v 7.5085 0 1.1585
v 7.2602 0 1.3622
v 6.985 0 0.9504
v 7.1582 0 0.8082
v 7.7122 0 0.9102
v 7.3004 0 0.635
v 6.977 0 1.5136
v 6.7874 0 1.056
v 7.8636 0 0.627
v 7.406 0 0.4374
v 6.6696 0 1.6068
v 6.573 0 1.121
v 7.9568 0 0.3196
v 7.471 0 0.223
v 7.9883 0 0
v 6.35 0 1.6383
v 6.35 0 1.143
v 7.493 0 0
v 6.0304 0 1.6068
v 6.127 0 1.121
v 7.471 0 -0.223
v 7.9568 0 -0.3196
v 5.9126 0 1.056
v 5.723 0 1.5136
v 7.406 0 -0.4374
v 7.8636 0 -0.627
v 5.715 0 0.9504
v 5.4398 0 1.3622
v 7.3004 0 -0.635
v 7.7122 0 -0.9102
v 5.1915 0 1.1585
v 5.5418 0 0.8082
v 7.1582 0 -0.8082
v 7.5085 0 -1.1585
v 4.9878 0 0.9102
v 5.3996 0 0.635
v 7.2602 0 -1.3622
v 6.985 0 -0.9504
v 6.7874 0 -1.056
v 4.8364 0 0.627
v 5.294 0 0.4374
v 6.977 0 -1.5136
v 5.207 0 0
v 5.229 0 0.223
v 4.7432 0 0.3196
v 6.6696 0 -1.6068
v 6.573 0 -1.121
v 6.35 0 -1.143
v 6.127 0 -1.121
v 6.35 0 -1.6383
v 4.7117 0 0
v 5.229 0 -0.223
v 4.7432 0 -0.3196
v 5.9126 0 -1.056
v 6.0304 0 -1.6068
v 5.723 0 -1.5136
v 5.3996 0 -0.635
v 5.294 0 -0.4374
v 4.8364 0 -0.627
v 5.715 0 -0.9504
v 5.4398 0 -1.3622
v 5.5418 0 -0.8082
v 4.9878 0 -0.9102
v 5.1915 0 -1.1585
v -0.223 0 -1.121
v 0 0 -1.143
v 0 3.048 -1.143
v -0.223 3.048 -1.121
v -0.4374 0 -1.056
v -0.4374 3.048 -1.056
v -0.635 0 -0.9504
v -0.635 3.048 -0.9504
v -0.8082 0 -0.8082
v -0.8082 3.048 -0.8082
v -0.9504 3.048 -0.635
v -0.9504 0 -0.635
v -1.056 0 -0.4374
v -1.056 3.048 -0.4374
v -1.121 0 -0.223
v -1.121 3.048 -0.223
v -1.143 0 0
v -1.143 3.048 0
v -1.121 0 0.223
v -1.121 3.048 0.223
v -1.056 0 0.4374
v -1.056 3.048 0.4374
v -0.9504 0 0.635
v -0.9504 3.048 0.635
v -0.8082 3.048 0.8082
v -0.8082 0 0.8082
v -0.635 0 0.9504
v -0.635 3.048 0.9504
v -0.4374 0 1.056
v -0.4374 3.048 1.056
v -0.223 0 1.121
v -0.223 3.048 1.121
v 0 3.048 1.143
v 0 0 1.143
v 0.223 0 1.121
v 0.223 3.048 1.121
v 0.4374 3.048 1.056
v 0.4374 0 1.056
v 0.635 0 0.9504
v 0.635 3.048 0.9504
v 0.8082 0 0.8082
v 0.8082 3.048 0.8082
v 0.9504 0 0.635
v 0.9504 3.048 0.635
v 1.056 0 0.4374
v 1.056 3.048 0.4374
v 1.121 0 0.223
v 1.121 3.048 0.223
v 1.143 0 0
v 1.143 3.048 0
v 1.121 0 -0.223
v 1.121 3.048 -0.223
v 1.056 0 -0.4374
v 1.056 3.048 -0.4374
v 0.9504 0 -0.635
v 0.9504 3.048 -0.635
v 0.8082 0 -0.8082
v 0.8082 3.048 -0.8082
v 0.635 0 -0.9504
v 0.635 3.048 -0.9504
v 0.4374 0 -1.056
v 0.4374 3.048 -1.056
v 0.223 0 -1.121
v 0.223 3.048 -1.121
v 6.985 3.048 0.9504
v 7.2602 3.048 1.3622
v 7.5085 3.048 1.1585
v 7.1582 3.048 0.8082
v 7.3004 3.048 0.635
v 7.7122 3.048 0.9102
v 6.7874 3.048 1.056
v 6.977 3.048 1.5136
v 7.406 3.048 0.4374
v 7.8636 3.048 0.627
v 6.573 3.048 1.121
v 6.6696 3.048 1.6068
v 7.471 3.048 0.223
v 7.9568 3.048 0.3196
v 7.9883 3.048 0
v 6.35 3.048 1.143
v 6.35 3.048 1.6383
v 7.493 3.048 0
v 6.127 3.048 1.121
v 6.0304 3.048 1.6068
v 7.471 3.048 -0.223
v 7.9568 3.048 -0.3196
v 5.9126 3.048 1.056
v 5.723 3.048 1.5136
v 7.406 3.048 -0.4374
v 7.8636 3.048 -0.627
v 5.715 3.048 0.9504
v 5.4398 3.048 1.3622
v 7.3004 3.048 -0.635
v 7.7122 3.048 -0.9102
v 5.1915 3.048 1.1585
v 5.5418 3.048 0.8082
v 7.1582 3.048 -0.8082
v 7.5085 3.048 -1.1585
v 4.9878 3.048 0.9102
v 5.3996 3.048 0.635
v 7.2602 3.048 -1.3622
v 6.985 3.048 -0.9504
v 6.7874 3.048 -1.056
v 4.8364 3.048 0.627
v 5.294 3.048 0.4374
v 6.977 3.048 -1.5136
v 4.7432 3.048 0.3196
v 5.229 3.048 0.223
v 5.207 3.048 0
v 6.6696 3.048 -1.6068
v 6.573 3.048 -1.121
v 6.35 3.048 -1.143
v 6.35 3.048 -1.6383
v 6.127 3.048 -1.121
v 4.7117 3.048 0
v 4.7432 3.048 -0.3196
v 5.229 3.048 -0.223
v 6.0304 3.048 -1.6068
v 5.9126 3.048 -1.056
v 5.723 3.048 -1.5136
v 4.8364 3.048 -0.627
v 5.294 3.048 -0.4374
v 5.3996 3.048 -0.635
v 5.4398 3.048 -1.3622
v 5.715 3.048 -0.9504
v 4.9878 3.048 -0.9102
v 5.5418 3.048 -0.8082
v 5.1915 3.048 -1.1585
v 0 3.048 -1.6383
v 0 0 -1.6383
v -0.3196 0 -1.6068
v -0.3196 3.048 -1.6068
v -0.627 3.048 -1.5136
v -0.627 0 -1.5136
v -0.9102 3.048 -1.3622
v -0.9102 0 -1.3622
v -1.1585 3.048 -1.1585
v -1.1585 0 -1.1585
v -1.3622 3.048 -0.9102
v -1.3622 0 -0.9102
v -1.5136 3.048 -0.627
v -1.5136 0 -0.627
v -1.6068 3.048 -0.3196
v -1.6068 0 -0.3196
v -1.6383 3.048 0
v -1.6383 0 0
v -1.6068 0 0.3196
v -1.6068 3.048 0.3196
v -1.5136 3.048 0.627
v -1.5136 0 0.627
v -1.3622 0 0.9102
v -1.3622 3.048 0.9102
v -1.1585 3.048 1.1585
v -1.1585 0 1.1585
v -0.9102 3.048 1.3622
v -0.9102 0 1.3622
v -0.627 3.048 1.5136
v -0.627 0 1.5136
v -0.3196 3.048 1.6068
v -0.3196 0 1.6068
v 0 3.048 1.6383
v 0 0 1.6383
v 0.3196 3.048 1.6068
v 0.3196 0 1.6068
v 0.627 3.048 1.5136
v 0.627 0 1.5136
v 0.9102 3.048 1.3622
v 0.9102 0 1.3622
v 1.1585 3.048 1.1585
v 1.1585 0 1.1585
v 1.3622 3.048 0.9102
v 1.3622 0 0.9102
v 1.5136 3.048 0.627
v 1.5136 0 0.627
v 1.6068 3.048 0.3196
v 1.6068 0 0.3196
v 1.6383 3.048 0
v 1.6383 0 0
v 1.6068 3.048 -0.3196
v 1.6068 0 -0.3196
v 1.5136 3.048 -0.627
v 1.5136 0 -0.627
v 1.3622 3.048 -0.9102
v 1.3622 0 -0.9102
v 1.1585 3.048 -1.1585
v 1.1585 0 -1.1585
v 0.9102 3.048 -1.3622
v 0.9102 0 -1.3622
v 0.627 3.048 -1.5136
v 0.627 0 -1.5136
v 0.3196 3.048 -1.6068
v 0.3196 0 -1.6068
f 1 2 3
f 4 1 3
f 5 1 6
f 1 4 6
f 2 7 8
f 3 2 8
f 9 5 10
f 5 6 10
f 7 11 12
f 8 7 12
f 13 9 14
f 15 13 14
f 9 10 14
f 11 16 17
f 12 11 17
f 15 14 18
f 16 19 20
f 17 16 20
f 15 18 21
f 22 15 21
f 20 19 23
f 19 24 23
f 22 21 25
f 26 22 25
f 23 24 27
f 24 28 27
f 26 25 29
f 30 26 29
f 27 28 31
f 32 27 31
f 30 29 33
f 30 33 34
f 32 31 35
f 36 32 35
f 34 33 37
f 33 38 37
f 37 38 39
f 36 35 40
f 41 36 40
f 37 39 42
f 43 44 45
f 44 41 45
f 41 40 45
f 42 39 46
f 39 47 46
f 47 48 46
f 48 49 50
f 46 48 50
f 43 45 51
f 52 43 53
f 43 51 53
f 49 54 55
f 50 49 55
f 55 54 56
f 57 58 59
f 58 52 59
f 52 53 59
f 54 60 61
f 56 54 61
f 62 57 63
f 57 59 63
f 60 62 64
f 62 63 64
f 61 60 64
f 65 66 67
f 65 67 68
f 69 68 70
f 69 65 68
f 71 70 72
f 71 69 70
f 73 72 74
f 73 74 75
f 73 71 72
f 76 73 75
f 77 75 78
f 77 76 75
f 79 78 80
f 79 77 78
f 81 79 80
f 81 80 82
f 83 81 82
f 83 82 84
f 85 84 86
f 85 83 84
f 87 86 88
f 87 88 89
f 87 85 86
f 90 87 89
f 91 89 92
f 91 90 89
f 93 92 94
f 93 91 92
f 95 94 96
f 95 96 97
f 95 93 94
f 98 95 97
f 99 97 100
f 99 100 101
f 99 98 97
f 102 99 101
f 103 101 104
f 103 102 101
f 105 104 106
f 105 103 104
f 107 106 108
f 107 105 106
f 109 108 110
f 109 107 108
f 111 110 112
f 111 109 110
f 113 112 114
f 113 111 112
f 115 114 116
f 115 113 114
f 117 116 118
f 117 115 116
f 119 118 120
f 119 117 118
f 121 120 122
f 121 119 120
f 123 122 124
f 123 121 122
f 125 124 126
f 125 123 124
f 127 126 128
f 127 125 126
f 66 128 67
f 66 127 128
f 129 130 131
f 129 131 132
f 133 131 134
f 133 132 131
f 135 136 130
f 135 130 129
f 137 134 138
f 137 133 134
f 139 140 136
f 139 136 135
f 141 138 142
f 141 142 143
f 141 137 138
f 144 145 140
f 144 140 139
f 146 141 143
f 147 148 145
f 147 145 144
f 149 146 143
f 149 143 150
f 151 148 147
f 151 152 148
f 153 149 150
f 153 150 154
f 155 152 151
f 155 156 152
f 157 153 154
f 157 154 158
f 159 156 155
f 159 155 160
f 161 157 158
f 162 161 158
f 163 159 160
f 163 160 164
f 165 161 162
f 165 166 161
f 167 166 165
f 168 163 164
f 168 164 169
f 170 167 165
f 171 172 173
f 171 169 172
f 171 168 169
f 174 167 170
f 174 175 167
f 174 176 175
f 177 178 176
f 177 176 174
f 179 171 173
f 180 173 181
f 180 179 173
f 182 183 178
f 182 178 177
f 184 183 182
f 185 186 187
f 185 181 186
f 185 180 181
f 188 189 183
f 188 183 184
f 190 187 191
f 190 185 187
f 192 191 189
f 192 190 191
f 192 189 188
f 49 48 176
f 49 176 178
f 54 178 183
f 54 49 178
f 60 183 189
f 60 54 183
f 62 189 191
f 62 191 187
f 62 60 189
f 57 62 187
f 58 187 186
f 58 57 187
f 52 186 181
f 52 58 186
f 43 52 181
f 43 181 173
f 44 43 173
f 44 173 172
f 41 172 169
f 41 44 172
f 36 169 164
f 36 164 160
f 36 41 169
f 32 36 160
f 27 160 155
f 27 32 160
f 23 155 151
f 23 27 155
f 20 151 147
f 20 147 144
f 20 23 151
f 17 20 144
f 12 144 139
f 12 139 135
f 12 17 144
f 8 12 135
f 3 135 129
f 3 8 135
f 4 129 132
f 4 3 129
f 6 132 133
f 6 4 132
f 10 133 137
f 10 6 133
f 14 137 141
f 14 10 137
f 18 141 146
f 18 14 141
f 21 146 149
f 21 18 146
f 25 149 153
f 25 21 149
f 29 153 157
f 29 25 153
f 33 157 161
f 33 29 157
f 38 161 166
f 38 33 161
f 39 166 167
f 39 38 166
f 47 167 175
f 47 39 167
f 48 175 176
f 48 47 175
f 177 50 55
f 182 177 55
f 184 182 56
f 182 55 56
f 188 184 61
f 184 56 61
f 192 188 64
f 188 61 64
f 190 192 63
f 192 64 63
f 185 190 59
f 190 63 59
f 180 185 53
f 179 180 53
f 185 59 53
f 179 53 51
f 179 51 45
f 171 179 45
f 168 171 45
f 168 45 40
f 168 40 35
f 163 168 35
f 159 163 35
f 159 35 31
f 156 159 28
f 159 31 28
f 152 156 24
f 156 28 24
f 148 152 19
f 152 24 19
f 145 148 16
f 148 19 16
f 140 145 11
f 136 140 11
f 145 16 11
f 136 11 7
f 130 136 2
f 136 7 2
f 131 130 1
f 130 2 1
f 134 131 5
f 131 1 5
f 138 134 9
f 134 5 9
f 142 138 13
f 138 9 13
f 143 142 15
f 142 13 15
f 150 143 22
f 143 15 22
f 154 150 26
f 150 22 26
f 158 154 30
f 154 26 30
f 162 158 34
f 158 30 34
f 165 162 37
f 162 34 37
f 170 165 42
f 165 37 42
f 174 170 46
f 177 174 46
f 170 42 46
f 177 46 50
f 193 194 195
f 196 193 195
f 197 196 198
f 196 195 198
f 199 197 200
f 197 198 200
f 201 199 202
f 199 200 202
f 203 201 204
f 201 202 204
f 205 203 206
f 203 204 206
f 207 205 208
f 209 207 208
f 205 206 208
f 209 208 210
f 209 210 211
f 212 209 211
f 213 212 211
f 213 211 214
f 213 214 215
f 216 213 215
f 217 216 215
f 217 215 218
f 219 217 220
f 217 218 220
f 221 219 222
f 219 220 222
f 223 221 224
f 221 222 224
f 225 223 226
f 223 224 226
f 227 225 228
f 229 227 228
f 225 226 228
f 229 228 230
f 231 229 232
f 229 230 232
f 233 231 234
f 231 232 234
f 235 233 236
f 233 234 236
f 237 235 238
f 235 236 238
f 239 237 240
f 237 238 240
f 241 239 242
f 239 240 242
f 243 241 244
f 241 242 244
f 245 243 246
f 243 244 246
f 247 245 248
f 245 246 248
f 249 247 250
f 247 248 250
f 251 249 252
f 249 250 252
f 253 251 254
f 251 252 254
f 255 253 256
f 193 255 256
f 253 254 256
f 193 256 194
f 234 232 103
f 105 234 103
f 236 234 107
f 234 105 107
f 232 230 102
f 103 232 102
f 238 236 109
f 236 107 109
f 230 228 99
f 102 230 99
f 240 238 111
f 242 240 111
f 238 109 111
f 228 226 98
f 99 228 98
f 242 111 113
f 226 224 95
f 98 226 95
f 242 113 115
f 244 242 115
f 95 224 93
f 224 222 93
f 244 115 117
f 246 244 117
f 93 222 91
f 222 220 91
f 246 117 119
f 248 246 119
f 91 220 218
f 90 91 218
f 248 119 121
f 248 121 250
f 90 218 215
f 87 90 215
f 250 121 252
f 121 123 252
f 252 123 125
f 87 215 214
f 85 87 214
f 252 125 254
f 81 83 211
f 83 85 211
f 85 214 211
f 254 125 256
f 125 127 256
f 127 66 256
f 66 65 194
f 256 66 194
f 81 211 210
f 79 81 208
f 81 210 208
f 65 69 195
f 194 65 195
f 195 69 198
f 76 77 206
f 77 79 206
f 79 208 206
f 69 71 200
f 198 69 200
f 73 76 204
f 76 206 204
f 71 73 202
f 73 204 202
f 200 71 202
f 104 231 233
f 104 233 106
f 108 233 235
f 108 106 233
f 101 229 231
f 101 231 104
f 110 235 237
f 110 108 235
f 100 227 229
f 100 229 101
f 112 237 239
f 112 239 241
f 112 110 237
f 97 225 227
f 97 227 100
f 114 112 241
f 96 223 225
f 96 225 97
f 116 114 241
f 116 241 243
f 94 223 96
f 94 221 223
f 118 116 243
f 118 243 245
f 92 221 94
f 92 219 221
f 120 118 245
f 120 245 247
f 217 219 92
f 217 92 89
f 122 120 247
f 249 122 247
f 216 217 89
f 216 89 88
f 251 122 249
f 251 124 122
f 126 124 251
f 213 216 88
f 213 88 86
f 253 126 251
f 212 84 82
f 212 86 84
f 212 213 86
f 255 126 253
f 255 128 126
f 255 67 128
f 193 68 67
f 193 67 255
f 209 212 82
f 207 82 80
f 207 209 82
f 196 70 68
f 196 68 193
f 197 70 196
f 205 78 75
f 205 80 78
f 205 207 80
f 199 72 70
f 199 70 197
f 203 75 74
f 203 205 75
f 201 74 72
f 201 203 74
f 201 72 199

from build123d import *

# Parameters (mm, degrees)
SKETCH1_R             = 1.6383
SKETCH1_R_2           = 1.143
BOSS_EXTRUDE1_DEPTH   = 3.048
BOSS_EXTRUDE1_2_DEPTH = 3.048


with BuildPart() as part:
    # Sketch1 → Boss-Extrude1 (new body)
    with BuildSketch(Plane(origin=(0, 0, 0), x_dir=(1, 0, 0), z_dir=(0, 1, 0))):
        with Locations(Location((6.35, 0, 0), (0, 0, 90))):
            Circle(SKETCH1_R)
        with Locations(Location((6.35, 0, 0), (0, 0, 90))):
            Circle(SKETCH1_R_2, mode=Mode.SUBTRACT)
    extrude(amount=BOSS_EXTRUDE1_DEPTH)


with BuildPart() as body_2:
    # Sketch1 → Boss-Extrude1 2 (new body)
    with BuildSketch(Plane(origin=(0, 0, 0), x_dir=(1, 0, 0), z_dir=(0, 1, 0))):
        with Locations(Location((0, 0, 0), (0, 0, 90))):
            Circle(SKETCH1_R)
        with Locations(Location((0, 0, 0), (0, 0, 90))):
            Circle(SKETCH1_R_2, mode=Mode.SUBTRACT)
    extrude(amount=BOSS_EXTRUDE1_2_DEPTH)


solid = Compound([part.part, body_2.part])
